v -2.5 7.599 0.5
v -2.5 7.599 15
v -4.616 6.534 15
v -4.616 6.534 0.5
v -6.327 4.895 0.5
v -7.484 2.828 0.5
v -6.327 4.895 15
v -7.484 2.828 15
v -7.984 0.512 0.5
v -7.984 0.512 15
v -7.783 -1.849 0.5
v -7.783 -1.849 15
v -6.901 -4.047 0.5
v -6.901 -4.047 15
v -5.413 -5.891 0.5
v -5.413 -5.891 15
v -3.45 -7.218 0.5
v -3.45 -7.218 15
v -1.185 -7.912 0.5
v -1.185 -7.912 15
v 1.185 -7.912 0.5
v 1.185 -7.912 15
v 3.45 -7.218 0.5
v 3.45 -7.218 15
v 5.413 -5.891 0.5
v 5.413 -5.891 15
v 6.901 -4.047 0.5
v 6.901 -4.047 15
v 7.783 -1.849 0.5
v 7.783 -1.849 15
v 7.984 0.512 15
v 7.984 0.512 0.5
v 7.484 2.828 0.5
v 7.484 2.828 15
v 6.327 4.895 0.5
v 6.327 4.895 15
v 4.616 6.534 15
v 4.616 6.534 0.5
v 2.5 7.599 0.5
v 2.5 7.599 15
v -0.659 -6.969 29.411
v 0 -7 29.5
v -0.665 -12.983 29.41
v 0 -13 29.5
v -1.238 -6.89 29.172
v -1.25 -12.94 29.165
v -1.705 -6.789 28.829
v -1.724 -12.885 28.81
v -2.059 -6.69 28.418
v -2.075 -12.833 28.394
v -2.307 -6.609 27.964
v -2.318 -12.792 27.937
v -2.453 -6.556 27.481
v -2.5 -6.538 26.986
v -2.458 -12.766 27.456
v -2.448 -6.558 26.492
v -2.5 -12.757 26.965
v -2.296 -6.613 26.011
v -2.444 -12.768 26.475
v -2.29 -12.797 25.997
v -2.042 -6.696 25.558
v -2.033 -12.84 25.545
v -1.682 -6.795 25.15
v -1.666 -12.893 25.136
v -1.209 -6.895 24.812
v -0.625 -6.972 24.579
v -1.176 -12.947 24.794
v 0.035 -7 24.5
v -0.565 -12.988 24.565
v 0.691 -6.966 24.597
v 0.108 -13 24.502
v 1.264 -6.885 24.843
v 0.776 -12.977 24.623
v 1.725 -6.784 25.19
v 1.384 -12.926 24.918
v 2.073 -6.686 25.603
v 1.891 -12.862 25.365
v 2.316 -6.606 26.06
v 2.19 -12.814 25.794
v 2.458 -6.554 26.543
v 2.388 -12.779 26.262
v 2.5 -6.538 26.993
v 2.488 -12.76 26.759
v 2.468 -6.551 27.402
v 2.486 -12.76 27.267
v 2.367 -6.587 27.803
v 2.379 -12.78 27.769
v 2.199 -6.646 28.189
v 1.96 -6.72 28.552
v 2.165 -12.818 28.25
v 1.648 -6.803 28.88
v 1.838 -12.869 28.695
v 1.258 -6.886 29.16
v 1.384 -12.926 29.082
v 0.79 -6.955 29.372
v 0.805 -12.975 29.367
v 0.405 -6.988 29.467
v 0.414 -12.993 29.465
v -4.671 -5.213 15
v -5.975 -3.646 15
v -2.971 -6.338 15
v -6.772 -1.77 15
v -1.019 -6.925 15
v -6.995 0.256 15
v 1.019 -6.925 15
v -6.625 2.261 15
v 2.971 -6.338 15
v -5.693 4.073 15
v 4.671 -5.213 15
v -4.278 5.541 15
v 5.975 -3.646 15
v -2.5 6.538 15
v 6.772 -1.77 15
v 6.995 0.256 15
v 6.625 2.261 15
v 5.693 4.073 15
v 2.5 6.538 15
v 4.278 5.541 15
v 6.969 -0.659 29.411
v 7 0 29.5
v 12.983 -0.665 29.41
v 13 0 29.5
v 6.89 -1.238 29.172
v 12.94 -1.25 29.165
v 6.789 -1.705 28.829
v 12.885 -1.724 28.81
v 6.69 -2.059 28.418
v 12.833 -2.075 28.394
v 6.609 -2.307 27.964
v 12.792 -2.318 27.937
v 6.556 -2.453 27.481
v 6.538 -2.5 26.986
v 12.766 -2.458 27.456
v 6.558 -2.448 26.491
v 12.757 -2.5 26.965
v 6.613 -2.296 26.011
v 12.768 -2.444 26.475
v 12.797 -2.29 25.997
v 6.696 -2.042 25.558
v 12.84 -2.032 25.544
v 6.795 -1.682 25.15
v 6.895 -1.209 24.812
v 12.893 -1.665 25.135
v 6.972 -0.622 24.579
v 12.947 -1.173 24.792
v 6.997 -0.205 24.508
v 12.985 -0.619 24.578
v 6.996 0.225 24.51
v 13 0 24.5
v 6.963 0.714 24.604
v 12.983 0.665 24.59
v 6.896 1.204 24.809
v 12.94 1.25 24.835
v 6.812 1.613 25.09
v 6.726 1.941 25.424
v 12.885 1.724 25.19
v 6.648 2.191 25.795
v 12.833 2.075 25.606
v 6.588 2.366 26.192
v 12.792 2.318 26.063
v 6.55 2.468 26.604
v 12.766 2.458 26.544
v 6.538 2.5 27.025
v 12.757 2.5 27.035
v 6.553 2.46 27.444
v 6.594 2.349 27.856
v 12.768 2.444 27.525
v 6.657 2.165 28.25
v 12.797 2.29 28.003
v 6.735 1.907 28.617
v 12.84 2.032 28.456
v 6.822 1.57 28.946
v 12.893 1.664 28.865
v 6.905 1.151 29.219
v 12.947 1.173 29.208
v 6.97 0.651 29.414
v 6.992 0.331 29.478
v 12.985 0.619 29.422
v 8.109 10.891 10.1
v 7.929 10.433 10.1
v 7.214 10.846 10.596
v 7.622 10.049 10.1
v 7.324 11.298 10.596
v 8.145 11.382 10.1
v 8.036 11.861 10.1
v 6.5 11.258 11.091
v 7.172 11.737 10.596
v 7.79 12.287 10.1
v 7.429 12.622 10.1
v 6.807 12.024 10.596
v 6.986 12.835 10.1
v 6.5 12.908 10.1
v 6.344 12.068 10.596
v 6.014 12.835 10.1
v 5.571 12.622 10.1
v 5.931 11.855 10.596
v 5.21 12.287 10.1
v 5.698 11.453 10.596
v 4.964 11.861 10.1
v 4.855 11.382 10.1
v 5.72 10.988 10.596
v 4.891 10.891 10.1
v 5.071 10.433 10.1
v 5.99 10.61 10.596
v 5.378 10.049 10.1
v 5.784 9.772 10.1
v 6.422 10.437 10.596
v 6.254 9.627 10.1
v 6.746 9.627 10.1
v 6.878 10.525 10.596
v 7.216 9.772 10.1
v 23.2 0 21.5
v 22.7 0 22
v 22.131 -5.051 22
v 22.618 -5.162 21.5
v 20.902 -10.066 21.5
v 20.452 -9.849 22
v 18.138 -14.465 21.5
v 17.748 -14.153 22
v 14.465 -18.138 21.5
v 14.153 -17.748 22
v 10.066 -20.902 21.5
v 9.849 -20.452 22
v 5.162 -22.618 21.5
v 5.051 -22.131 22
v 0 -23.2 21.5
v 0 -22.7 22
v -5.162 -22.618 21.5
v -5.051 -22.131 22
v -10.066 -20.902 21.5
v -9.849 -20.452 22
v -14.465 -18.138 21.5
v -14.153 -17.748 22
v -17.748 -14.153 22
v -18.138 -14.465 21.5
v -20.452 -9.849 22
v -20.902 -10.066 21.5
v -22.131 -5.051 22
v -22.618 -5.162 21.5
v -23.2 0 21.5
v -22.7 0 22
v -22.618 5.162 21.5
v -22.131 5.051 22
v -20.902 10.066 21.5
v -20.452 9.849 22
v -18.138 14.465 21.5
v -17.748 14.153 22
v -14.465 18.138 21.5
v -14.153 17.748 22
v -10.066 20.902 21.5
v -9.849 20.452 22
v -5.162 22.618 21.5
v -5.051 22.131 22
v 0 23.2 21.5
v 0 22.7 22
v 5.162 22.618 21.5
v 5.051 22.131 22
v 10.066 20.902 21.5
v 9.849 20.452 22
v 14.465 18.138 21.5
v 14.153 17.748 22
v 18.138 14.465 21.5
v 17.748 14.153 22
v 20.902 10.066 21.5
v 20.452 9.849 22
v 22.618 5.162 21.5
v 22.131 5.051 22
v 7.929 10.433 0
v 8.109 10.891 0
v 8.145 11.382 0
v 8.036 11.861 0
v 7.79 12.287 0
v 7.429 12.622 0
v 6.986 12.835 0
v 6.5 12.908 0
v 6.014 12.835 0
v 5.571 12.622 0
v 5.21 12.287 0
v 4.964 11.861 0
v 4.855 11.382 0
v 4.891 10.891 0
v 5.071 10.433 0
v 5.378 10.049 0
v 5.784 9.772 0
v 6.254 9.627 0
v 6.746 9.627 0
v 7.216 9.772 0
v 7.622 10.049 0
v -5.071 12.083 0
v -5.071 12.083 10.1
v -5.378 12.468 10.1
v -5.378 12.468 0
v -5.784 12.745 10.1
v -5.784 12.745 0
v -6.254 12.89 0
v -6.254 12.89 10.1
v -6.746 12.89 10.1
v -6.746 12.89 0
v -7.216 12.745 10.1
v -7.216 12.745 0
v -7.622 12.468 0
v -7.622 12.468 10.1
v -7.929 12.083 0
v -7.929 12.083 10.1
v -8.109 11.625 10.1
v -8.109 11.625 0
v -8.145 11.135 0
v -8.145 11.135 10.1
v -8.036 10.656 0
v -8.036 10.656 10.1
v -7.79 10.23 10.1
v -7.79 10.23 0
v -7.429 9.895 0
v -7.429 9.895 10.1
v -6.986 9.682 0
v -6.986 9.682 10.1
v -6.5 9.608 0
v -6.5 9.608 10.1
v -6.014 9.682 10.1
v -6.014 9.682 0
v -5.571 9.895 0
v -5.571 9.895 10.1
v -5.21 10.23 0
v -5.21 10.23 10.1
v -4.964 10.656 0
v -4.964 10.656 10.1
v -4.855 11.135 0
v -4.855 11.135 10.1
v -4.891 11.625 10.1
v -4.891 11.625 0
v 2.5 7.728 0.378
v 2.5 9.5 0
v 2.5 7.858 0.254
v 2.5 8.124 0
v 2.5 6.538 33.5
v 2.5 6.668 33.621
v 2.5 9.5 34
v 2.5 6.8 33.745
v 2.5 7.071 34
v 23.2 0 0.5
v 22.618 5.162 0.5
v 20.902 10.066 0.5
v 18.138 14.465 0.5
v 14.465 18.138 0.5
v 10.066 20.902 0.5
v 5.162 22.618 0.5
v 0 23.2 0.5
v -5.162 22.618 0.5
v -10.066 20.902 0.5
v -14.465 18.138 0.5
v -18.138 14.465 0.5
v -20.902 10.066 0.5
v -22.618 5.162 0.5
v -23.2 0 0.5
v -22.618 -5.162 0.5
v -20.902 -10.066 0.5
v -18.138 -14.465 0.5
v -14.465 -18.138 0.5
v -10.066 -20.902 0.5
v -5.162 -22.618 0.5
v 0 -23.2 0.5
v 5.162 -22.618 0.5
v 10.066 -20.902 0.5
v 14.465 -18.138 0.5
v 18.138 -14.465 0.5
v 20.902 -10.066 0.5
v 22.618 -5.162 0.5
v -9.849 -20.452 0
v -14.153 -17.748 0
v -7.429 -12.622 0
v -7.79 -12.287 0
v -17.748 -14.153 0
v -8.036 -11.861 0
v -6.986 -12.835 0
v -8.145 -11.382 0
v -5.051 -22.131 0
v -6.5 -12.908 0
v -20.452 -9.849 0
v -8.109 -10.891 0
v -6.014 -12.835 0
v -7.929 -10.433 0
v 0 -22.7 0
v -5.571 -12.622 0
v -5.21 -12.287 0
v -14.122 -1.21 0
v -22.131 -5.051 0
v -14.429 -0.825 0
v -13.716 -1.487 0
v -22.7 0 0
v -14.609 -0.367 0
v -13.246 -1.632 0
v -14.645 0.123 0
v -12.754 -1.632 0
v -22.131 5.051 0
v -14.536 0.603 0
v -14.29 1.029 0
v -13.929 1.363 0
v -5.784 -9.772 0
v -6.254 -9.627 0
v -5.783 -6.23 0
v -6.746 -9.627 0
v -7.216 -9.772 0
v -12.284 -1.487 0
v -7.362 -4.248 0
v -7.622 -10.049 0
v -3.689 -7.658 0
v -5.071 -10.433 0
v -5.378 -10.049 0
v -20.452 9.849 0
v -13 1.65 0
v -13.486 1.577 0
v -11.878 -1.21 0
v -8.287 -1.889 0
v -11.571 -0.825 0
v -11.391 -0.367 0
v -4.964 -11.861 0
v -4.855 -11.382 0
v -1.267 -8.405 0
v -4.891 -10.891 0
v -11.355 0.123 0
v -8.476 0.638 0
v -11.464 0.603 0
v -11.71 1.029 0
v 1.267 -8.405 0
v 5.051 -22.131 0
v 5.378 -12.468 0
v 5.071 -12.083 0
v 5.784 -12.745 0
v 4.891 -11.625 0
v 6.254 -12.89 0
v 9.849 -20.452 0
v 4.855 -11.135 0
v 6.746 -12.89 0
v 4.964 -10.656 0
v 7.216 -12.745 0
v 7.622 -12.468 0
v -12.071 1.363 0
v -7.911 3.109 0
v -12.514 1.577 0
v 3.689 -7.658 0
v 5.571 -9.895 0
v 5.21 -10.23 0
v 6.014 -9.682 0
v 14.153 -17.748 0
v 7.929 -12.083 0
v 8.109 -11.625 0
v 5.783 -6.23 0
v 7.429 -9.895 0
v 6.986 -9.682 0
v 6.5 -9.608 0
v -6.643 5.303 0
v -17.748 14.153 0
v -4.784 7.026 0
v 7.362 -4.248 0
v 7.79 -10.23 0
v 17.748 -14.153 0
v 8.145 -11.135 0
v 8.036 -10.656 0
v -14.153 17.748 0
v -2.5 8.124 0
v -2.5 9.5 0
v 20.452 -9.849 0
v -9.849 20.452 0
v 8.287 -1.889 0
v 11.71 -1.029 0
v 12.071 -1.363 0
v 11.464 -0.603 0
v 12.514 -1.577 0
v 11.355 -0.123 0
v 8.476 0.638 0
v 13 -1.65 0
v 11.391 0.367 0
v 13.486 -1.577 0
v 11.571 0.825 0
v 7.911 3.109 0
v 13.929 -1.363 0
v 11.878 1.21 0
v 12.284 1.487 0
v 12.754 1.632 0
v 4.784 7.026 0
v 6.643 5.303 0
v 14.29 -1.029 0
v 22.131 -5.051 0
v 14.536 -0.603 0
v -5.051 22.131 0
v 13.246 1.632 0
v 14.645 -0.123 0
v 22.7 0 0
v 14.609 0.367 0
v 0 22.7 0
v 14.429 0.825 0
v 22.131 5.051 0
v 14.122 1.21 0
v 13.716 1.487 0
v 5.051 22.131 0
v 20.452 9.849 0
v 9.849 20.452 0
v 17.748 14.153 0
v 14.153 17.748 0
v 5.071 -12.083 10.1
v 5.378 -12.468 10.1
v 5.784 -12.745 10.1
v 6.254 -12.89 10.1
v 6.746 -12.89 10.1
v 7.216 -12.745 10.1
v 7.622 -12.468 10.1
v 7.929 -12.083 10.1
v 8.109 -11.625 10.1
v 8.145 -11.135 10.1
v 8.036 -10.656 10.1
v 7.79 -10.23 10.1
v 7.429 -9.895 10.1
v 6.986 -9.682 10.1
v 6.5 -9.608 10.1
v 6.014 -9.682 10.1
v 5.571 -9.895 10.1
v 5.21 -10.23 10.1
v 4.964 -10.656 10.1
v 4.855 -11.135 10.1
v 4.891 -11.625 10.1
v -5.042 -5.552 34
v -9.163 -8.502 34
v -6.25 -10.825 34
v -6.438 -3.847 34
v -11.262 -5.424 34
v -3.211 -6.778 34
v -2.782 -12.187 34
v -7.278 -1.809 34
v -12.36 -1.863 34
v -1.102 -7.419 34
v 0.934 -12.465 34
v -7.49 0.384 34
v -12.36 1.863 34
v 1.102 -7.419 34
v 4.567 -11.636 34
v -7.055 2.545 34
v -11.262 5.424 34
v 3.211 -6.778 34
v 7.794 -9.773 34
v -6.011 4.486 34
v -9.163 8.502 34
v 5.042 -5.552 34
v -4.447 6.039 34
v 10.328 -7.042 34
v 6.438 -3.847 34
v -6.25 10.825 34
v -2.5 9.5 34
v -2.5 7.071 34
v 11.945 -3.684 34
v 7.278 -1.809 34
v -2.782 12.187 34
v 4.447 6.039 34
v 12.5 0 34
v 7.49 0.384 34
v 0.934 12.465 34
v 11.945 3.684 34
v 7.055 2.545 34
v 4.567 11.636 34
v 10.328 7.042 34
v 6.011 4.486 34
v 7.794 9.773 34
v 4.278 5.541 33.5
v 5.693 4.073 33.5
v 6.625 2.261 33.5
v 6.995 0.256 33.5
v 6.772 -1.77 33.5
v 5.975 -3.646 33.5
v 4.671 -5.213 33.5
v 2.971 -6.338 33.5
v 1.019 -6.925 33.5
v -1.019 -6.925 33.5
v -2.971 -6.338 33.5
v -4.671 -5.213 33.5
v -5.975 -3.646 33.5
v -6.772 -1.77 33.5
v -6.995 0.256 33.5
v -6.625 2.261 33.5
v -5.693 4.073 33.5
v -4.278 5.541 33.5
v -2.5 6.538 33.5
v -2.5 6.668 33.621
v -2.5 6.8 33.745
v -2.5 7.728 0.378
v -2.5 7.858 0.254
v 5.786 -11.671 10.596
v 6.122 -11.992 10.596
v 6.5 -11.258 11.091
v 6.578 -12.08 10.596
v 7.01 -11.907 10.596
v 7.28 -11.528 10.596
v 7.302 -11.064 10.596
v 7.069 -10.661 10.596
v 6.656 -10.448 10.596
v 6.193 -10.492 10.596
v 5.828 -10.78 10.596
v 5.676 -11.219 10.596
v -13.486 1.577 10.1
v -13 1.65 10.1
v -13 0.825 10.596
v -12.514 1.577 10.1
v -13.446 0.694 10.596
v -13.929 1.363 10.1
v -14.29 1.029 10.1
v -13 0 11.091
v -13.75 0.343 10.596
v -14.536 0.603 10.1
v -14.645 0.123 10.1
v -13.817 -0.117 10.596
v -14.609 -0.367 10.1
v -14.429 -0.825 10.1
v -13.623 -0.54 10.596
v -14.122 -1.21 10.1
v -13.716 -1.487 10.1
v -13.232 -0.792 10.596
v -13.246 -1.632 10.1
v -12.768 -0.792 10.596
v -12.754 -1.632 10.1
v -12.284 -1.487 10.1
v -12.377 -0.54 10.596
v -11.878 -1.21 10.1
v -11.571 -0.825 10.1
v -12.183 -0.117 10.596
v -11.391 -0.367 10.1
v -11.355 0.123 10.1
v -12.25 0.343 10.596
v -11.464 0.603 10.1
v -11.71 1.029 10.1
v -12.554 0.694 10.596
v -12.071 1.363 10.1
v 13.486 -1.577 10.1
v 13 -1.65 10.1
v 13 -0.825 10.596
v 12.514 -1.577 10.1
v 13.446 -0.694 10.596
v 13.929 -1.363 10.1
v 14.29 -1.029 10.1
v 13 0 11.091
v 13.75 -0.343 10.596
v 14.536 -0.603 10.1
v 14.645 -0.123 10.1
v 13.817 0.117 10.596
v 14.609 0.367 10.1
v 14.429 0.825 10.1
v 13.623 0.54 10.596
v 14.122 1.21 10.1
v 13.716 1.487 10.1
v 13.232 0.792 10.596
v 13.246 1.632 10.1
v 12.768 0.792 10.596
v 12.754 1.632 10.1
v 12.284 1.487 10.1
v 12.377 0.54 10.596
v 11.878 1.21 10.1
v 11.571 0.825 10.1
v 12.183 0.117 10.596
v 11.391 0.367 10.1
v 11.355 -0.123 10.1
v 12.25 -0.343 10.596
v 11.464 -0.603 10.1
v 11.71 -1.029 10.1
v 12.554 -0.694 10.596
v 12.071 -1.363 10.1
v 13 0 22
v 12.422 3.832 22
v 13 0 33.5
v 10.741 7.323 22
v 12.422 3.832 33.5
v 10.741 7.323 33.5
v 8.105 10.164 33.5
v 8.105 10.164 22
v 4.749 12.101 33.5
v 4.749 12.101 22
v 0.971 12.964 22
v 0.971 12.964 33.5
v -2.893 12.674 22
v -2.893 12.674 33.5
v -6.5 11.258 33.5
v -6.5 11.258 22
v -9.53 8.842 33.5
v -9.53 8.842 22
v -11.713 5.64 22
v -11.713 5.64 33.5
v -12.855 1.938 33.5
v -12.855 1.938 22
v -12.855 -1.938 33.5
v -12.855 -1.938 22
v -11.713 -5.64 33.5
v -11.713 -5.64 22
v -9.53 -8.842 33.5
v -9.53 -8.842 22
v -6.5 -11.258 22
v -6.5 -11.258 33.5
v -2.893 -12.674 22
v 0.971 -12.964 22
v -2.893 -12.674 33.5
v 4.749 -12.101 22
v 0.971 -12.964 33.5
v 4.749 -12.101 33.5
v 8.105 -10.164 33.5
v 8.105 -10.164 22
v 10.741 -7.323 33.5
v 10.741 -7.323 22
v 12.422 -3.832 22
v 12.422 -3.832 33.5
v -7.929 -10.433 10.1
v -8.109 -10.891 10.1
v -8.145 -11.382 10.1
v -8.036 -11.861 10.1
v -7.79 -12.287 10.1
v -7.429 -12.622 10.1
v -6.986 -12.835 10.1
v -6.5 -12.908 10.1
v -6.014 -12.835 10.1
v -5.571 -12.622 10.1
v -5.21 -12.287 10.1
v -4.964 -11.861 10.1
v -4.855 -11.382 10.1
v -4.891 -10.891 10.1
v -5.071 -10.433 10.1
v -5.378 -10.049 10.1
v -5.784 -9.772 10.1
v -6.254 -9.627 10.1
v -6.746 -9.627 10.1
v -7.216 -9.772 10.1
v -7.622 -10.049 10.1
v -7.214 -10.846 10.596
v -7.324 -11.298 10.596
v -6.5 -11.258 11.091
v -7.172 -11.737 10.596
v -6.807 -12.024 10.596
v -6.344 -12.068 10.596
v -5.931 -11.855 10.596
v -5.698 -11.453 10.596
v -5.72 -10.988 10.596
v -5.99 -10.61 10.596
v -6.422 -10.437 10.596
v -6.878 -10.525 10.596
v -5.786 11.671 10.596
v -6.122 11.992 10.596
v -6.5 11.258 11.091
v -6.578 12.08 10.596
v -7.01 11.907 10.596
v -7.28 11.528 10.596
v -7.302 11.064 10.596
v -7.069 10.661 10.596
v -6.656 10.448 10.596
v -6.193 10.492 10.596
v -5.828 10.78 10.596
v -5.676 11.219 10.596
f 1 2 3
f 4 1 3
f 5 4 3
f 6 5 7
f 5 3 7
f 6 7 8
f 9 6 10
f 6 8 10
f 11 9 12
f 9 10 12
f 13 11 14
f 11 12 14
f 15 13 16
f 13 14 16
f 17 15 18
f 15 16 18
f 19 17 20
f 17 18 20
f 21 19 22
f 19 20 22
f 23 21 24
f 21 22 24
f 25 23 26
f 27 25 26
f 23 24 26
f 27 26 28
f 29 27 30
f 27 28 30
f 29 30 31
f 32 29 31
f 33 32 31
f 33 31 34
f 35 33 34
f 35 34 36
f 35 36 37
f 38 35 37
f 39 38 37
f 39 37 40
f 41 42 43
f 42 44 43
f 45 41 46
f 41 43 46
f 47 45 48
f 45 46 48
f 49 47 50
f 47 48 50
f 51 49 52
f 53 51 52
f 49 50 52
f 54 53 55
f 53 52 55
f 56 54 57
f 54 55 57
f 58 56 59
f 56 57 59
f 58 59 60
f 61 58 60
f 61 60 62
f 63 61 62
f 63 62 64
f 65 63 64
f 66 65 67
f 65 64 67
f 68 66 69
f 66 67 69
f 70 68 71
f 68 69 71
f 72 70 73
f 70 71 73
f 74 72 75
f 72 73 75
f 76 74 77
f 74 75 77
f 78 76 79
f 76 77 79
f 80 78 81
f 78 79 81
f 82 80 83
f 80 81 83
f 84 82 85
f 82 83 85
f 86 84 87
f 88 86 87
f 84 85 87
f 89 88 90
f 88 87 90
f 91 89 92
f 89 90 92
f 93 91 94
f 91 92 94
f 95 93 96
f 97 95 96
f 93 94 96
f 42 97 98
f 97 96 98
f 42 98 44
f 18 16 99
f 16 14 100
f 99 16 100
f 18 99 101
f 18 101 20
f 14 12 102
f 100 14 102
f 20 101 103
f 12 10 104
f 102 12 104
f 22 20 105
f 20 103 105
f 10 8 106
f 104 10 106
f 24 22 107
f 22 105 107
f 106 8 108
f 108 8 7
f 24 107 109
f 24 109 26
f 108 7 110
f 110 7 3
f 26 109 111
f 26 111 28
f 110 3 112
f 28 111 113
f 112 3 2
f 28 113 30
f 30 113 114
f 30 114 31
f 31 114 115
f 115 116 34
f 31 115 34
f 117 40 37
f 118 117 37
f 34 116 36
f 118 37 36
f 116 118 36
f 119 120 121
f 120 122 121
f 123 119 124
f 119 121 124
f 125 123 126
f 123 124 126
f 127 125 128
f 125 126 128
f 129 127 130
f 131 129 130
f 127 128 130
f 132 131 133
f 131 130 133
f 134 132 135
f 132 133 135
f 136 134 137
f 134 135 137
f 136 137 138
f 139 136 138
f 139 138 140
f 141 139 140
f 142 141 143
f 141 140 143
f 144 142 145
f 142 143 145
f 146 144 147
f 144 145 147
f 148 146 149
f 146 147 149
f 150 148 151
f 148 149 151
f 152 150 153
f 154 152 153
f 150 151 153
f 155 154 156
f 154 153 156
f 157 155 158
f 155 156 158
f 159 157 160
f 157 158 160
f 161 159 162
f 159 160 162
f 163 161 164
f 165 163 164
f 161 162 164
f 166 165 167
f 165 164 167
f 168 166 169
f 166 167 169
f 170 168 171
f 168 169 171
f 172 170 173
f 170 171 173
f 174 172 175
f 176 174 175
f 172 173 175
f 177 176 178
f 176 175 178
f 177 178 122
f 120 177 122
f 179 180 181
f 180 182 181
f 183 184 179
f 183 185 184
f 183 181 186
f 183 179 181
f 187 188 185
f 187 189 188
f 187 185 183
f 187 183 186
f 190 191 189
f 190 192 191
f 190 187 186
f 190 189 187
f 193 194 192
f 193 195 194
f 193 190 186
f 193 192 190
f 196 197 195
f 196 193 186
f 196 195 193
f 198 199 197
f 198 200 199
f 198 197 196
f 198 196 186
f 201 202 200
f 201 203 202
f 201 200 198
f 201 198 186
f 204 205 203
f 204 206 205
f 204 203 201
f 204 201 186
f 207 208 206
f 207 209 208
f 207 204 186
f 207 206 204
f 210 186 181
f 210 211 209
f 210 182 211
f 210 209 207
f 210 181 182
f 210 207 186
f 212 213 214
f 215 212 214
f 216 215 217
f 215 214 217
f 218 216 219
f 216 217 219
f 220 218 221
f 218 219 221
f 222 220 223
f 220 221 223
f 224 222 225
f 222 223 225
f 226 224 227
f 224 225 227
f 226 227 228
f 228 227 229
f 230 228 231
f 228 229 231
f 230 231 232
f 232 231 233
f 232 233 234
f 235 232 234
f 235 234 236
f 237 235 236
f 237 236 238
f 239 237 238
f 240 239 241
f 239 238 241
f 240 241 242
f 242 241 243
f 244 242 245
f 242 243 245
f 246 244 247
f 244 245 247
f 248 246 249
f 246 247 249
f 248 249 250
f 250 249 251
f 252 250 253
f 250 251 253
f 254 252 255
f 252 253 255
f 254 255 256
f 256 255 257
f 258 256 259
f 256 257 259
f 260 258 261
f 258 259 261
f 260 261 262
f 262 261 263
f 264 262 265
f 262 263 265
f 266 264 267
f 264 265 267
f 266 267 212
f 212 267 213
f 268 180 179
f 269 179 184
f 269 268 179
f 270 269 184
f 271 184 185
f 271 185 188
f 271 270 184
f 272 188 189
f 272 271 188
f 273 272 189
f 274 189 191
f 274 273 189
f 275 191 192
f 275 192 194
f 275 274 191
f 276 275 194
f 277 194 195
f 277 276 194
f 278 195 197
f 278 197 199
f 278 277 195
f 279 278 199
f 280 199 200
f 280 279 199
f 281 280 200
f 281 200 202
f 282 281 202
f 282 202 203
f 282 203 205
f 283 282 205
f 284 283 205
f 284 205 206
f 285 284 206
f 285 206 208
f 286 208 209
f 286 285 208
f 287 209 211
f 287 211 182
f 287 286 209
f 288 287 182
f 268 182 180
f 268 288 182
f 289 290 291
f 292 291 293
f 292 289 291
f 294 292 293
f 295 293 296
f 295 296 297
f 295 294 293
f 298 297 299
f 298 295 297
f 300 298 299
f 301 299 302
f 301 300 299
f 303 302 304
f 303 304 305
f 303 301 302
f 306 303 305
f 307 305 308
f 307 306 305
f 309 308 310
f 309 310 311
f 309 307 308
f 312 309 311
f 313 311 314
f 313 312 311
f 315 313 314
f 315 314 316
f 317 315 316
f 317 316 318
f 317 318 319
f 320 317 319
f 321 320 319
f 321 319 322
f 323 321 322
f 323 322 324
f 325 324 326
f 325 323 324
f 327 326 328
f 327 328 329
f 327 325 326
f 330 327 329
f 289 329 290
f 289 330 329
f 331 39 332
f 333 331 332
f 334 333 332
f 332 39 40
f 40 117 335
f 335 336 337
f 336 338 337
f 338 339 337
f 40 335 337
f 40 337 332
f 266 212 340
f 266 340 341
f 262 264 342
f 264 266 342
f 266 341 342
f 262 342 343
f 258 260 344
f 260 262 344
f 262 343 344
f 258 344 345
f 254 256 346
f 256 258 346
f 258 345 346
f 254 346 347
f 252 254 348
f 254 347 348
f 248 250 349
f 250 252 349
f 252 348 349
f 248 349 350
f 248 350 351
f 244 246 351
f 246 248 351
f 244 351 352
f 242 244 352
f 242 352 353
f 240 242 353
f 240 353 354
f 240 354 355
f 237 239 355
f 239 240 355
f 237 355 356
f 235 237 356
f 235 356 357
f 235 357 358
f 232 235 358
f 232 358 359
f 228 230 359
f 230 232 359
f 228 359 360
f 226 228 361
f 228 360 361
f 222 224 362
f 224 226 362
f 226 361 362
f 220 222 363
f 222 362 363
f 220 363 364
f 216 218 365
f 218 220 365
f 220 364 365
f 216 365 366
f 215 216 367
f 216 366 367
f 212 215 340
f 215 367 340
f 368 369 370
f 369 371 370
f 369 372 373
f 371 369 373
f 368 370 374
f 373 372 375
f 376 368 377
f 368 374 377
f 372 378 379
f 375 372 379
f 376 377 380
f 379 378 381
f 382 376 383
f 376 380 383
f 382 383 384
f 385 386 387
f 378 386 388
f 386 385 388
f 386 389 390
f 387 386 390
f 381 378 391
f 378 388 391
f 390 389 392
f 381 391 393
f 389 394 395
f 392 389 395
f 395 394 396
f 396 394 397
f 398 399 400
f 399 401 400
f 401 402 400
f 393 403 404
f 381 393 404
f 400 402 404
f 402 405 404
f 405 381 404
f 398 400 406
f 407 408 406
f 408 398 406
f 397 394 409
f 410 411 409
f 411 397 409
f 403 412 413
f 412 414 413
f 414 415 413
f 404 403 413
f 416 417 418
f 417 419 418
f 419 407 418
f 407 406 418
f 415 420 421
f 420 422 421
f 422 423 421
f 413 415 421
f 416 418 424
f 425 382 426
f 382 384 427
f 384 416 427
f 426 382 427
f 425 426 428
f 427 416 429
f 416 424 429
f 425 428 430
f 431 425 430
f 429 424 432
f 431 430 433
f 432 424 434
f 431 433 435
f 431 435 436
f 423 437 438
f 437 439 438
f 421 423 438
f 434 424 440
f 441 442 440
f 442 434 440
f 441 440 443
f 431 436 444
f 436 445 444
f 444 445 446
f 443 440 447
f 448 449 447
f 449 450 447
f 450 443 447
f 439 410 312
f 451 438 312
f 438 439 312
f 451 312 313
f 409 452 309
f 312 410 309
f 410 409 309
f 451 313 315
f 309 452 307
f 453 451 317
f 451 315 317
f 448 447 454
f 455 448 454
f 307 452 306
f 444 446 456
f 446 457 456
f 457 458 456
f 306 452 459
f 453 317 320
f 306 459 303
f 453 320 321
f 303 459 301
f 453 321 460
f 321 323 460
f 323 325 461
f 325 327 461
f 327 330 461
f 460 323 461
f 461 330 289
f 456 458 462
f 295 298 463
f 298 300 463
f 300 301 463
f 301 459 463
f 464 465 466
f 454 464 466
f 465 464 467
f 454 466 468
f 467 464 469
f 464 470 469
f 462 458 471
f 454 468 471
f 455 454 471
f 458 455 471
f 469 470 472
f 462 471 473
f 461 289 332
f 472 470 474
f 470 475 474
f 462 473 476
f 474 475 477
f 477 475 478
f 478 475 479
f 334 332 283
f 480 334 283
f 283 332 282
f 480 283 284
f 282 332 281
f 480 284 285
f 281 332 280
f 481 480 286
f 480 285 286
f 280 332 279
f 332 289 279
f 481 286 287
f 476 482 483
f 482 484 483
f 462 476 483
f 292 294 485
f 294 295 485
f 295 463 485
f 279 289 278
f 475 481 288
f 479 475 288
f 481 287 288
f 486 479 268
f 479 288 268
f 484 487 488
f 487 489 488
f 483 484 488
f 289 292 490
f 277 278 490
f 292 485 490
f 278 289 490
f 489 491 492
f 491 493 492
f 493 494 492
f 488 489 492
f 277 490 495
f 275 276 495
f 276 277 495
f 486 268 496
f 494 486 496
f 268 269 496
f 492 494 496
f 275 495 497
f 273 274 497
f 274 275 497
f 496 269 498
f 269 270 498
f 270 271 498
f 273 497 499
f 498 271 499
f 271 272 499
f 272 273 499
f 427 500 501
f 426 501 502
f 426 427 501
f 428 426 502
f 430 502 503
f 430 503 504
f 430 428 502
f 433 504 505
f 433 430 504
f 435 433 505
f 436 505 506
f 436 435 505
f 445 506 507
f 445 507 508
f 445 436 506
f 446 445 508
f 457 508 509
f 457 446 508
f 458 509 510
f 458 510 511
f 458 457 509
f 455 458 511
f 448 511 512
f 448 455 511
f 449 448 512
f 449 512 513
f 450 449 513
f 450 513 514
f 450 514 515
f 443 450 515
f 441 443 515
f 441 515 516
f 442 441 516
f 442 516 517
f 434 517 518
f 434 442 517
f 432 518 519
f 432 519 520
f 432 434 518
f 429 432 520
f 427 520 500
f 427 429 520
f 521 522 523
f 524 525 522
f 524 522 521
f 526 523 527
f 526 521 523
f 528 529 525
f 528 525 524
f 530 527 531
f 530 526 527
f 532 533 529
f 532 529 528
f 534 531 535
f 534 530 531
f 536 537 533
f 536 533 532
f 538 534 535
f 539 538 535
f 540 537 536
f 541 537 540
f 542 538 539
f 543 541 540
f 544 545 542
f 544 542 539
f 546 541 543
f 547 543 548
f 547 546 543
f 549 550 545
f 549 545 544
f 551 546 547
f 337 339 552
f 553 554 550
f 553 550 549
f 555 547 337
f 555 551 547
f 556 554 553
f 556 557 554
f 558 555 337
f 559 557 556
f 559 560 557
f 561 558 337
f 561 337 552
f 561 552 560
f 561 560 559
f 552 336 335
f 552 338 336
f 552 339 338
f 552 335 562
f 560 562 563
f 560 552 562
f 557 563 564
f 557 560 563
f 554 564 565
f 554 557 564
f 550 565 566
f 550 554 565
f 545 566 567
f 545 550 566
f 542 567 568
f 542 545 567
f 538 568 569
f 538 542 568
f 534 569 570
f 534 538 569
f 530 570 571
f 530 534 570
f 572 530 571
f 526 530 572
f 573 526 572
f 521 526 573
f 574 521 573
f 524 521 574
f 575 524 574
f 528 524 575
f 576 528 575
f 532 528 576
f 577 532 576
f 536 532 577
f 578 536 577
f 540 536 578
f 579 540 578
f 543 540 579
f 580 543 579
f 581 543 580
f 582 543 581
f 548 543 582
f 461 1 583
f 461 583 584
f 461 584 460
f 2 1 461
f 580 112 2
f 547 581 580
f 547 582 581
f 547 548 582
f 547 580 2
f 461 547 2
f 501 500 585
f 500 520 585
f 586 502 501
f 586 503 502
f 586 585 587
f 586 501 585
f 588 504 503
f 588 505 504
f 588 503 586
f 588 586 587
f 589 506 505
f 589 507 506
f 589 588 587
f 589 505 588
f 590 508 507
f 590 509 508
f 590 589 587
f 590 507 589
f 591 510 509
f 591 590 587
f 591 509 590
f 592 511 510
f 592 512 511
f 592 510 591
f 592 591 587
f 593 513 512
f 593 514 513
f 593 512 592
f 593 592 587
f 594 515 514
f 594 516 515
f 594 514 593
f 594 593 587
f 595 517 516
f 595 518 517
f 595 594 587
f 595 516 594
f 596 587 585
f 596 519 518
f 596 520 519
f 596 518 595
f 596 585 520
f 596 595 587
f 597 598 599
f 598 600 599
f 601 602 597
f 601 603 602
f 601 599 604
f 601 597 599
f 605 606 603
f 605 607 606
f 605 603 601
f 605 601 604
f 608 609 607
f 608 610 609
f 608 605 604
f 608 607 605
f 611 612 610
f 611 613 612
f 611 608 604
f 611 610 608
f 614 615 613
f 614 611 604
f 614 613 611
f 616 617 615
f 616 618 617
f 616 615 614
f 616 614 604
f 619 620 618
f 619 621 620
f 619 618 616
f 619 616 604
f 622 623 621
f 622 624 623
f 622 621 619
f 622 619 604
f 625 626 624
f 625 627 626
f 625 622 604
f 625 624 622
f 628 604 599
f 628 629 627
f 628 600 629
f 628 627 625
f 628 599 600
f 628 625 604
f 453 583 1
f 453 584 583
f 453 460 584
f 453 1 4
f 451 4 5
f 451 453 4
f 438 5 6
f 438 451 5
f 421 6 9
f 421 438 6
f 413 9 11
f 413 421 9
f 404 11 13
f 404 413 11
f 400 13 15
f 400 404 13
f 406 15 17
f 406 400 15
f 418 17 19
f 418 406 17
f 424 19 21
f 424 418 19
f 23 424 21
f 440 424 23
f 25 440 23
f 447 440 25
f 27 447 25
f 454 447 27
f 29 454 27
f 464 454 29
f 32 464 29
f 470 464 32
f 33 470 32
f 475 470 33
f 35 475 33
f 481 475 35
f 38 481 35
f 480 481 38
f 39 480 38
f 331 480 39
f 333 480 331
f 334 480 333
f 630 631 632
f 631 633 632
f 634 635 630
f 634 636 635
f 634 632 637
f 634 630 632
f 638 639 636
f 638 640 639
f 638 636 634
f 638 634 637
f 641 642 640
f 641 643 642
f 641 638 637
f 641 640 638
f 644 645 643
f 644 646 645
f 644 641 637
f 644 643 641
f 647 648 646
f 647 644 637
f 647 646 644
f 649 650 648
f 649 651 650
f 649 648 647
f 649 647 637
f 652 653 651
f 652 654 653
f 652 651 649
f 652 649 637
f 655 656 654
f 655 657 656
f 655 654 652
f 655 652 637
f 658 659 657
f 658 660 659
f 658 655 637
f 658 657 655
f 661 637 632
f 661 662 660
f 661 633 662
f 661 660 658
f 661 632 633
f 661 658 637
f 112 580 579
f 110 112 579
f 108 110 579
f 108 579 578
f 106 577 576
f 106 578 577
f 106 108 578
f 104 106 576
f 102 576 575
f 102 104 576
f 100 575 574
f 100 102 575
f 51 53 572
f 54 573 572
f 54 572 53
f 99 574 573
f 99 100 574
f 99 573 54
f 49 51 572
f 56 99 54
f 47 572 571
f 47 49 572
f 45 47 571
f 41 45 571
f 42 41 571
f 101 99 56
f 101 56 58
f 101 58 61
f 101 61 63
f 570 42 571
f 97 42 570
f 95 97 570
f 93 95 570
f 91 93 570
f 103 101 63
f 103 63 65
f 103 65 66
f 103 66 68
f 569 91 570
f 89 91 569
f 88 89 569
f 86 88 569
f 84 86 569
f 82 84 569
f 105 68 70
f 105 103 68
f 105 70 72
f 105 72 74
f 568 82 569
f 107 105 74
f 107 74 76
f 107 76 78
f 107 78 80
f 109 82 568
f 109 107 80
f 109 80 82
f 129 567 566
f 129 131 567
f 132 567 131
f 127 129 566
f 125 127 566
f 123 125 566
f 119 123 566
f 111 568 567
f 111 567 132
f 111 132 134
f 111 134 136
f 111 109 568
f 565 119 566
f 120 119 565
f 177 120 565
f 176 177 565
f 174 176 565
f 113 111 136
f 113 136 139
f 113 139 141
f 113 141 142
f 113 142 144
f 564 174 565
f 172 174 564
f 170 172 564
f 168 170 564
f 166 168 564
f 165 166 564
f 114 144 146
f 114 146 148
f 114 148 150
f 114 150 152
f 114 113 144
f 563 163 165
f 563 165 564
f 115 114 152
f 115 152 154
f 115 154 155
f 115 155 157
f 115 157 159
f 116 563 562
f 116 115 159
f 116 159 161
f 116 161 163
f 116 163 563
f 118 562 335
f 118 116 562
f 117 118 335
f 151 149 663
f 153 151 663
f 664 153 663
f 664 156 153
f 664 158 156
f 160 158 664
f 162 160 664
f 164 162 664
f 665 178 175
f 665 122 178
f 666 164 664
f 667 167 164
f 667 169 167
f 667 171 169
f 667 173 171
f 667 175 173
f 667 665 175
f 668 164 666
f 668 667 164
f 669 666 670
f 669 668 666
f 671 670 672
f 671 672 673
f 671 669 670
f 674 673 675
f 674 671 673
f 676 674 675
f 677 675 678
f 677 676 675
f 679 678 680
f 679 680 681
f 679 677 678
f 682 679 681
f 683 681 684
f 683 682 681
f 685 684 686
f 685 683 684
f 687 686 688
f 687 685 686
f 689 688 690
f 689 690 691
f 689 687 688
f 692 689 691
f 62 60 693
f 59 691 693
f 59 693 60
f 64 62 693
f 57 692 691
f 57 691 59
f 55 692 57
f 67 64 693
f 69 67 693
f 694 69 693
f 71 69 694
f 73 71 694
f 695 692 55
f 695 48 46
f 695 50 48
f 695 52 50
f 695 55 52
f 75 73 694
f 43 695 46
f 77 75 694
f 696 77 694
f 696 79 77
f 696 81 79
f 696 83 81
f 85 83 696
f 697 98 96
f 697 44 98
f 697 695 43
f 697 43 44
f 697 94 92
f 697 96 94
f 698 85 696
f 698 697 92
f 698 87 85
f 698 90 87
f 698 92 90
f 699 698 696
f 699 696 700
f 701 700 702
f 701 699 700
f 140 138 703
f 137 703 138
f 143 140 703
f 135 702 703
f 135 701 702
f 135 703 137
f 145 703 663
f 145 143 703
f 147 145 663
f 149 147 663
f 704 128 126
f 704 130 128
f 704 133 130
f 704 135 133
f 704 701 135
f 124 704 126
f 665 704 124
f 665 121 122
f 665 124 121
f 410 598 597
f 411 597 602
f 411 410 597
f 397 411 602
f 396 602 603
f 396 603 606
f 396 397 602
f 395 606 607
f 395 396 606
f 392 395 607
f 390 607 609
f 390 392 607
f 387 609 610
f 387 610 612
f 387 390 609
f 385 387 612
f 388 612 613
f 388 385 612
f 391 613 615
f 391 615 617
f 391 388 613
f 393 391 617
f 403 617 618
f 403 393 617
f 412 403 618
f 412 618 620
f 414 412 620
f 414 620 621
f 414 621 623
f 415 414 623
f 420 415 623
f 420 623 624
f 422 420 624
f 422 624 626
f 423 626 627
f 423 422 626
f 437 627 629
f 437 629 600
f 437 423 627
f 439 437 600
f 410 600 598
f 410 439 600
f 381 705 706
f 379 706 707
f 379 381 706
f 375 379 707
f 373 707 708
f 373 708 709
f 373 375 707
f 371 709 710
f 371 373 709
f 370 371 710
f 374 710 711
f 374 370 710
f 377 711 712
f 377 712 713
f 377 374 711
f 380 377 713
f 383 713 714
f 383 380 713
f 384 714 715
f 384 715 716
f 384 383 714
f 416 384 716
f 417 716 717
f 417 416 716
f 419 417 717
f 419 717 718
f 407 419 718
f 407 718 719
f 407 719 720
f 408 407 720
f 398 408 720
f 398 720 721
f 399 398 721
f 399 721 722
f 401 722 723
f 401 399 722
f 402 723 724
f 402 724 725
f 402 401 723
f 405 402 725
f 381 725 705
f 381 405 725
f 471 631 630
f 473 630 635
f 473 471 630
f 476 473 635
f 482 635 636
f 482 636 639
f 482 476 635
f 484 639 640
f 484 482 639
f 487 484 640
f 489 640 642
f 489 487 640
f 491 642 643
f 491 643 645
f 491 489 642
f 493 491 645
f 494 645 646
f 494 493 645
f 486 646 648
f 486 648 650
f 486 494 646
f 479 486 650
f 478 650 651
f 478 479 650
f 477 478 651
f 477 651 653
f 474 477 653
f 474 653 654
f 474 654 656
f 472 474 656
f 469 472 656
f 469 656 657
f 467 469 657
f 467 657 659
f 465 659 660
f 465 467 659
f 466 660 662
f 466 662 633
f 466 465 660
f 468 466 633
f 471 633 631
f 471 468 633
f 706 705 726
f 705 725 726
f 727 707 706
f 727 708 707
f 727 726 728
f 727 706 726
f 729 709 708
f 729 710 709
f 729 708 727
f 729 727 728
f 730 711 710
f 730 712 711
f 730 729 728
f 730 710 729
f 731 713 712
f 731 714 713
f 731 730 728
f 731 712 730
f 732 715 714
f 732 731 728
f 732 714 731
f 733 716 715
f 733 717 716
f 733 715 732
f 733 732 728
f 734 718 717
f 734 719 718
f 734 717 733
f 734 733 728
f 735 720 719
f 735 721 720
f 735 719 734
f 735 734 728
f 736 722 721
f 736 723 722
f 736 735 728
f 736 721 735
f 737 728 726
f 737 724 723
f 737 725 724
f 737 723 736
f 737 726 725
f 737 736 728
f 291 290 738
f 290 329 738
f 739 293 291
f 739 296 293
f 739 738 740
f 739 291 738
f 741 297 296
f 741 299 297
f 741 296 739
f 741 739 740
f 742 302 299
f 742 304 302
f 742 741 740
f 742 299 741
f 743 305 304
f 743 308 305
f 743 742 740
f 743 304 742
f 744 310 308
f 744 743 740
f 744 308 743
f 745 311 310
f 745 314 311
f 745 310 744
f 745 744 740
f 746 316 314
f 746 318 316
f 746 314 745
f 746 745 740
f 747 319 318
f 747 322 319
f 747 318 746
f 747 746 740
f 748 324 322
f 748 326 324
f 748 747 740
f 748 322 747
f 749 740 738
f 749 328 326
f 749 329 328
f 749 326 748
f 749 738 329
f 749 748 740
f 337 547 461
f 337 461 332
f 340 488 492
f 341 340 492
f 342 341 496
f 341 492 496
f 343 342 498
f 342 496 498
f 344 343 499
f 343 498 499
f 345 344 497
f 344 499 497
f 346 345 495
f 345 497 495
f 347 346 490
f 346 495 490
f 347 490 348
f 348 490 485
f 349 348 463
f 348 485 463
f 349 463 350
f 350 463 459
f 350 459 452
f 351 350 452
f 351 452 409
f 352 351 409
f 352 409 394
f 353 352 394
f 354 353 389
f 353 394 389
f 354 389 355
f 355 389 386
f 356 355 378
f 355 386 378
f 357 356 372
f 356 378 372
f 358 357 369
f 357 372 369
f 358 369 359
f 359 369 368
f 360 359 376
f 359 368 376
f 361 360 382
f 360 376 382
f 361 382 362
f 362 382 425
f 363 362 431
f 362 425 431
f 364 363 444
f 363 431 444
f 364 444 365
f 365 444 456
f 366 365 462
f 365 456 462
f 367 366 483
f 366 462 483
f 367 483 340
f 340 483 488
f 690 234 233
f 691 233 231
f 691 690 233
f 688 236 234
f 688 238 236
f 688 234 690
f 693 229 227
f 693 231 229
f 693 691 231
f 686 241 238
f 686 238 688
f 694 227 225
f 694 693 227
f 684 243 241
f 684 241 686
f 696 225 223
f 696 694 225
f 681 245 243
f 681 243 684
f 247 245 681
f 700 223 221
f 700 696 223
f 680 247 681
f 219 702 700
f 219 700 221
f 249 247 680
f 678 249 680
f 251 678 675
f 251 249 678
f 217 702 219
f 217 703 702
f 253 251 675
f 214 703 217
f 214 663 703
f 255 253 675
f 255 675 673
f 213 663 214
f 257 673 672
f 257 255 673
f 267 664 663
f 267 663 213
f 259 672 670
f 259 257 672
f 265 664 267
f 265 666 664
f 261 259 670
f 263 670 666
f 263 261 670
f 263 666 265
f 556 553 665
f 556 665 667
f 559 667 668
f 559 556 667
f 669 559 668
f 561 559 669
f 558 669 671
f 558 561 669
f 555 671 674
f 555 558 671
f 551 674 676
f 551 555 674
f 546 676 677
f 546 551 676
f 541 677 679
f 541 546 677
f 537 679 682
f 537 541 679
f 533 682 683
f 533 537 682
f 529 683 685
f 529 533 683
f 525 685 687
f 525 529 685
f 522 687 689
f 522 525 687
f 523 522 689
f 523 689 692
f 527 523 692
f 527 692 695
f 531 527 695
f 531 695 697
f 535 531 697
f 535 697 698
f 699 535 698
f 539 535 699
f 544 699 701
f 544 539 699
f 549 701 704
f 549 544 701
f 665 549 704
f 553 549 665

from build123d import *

# Parameters (mm, degrees)
SKETCH_1_R               = 23.2
SKETCH_1_R_2             = 7
EXTRUDE_1_DEPTH          = 34
SKETCH_2_R               = 34.674614003
SKETCH_2_R_2             = 13
CUT_EXTRUDE_1_DEPTH      = 12
HOLE_WIZARD_1_D          = 16
HOLE_WIZARD_1_DEPTH      = 15
SKETCH_3_W               = 5
SKETCH_3_H               = 10.2
CUT_EXTRUDE_2_DEPTH      = 48.249126976
SKETCH_4_W               = 2.5
SKETCH_4_H               = 23.2
PATTERN_CIRCULAR_2_COUNT = 6
PATTERN_CIRCULAR_1_COUNT = 2
PATTERN_CIRCULAR_1_ANGLE = 90
CHAMFER_1_SIZE           = 0.5


with BuildPart() as part:
    # 草图1 → 凸台-拉伸1 (new body)
    with BuildSketch(Plane.XY):
        Circle(SKETCH_1_R)
        Circle(SKETCH_1_R_2, mode=Mode.SUBTRACT)
    extrude(amount=EXTRUDE_1_DEPTH)

    # 草图2 → 切除-拉伸1 (cut)
    with BuildSketch(Plane.XY.offset(34)):
        Circle(SKETCH_2_R)
        Circle(SKETCH_2_R_2, mode=Mode.SUBTRACT)
    extrude(amount=-CUT_EXTRUDE_1_DEPTH, mode=Mode.SUBTRACT)

    # 孔1
    with Locations(Plane(origin=(0, 0, 0), x_dir=(-1, 0, 0), z_dir=(0, 0, -1))):
        with Locations((0, 0)):
            Hole(HOLE_WIZARD_1_D / 2, depth=HOLE_WIZARD_1_DEPTH)

    # 草图3 → 切除-拉伸2 (cut, through all)
    with BuildSketch(Plane.XY.offset(34)):
        with Locations((0, 4.4)):
            Rectangle(SKETCH_3_W, SKETCH_3_H)
    extrude(amount=-CUT_EXTRUDE_2_DEPTH, mode=Mode.SUBTRACT)

    # 草图4 → M6 螺纹孔1 (revolve, cut)
    with BuildSketch(Plane(origin=(0, 0, 27), x_dir=(0, 0, 1), z_dir=(1, 0, 0))):
        with Locations((1.25, 11.6)):
            Rectangle(SKETCH_4_W, SKETCH_4_H)
    hole_wizard_m6_1 = revolve(axis=Axis((0, 6.35, 27), (0, -1, 0)), mode=Mode.SUBTRACT)

    # 草图8 → M4 螺纹孔1 (revolve, cut)
    with BuildSketch(Plane.YZ.offset(-13)):
        Polygon((0, 0), (0, 11.091420021), (1.65, 10.1), (1.65, 0), align=None)
    hole_wizard_m4_1 = revolve(axis=Axis((-13, 0, -6.35), (0, 0, 1)), mode=Mode.SUBTRACT)

    # 阵列(圆周)2: M4 螺纹孔1 ×6 about axis
    pattern_circular_2_axis = Axis((0, 0, 0), (0, 0, 1))
    for i in range(1, PATTERN_CIRCULAR_2_COUNT):
        add(hole_wizard_m4_1.rotate(pattern_circular_2_axis, i * 360 / PATTERN_CIRCULAR_2_COUNT), mode=Mode.SUBTRACT)

    # 阵列(圆周)1: M6 螺纹孔1 ×2 about axis
    pattern_circular_1_axis = Axis((0, 0, 22), (0, 0, 1))
    for i in range(1, PATTERN_CIRCULAR_1_COUNT):
        add(hole_wizard_m6_1.rotate(pattern_circular_1_axis, i * PATTERN_CIRCULAR_1_ANGLE / (PATTERN_CIRCULAR_1_COUNT - 1)), mode=Mode.SUBTRACT)

    # 倒角1
    chamfer_1_edges = [part.edges().sort_by_distance(p)[0] for p in [
        (-23.2, 0, 22),
        (-13, 0, 34),
        (-23.2, 0, 0),
        (0, -8, 0),
        (0, -7, 34),
    ]]
    chamfer(chamfer_1_edges, length=CHAMFER_1_SIZE)


solid = part.part
